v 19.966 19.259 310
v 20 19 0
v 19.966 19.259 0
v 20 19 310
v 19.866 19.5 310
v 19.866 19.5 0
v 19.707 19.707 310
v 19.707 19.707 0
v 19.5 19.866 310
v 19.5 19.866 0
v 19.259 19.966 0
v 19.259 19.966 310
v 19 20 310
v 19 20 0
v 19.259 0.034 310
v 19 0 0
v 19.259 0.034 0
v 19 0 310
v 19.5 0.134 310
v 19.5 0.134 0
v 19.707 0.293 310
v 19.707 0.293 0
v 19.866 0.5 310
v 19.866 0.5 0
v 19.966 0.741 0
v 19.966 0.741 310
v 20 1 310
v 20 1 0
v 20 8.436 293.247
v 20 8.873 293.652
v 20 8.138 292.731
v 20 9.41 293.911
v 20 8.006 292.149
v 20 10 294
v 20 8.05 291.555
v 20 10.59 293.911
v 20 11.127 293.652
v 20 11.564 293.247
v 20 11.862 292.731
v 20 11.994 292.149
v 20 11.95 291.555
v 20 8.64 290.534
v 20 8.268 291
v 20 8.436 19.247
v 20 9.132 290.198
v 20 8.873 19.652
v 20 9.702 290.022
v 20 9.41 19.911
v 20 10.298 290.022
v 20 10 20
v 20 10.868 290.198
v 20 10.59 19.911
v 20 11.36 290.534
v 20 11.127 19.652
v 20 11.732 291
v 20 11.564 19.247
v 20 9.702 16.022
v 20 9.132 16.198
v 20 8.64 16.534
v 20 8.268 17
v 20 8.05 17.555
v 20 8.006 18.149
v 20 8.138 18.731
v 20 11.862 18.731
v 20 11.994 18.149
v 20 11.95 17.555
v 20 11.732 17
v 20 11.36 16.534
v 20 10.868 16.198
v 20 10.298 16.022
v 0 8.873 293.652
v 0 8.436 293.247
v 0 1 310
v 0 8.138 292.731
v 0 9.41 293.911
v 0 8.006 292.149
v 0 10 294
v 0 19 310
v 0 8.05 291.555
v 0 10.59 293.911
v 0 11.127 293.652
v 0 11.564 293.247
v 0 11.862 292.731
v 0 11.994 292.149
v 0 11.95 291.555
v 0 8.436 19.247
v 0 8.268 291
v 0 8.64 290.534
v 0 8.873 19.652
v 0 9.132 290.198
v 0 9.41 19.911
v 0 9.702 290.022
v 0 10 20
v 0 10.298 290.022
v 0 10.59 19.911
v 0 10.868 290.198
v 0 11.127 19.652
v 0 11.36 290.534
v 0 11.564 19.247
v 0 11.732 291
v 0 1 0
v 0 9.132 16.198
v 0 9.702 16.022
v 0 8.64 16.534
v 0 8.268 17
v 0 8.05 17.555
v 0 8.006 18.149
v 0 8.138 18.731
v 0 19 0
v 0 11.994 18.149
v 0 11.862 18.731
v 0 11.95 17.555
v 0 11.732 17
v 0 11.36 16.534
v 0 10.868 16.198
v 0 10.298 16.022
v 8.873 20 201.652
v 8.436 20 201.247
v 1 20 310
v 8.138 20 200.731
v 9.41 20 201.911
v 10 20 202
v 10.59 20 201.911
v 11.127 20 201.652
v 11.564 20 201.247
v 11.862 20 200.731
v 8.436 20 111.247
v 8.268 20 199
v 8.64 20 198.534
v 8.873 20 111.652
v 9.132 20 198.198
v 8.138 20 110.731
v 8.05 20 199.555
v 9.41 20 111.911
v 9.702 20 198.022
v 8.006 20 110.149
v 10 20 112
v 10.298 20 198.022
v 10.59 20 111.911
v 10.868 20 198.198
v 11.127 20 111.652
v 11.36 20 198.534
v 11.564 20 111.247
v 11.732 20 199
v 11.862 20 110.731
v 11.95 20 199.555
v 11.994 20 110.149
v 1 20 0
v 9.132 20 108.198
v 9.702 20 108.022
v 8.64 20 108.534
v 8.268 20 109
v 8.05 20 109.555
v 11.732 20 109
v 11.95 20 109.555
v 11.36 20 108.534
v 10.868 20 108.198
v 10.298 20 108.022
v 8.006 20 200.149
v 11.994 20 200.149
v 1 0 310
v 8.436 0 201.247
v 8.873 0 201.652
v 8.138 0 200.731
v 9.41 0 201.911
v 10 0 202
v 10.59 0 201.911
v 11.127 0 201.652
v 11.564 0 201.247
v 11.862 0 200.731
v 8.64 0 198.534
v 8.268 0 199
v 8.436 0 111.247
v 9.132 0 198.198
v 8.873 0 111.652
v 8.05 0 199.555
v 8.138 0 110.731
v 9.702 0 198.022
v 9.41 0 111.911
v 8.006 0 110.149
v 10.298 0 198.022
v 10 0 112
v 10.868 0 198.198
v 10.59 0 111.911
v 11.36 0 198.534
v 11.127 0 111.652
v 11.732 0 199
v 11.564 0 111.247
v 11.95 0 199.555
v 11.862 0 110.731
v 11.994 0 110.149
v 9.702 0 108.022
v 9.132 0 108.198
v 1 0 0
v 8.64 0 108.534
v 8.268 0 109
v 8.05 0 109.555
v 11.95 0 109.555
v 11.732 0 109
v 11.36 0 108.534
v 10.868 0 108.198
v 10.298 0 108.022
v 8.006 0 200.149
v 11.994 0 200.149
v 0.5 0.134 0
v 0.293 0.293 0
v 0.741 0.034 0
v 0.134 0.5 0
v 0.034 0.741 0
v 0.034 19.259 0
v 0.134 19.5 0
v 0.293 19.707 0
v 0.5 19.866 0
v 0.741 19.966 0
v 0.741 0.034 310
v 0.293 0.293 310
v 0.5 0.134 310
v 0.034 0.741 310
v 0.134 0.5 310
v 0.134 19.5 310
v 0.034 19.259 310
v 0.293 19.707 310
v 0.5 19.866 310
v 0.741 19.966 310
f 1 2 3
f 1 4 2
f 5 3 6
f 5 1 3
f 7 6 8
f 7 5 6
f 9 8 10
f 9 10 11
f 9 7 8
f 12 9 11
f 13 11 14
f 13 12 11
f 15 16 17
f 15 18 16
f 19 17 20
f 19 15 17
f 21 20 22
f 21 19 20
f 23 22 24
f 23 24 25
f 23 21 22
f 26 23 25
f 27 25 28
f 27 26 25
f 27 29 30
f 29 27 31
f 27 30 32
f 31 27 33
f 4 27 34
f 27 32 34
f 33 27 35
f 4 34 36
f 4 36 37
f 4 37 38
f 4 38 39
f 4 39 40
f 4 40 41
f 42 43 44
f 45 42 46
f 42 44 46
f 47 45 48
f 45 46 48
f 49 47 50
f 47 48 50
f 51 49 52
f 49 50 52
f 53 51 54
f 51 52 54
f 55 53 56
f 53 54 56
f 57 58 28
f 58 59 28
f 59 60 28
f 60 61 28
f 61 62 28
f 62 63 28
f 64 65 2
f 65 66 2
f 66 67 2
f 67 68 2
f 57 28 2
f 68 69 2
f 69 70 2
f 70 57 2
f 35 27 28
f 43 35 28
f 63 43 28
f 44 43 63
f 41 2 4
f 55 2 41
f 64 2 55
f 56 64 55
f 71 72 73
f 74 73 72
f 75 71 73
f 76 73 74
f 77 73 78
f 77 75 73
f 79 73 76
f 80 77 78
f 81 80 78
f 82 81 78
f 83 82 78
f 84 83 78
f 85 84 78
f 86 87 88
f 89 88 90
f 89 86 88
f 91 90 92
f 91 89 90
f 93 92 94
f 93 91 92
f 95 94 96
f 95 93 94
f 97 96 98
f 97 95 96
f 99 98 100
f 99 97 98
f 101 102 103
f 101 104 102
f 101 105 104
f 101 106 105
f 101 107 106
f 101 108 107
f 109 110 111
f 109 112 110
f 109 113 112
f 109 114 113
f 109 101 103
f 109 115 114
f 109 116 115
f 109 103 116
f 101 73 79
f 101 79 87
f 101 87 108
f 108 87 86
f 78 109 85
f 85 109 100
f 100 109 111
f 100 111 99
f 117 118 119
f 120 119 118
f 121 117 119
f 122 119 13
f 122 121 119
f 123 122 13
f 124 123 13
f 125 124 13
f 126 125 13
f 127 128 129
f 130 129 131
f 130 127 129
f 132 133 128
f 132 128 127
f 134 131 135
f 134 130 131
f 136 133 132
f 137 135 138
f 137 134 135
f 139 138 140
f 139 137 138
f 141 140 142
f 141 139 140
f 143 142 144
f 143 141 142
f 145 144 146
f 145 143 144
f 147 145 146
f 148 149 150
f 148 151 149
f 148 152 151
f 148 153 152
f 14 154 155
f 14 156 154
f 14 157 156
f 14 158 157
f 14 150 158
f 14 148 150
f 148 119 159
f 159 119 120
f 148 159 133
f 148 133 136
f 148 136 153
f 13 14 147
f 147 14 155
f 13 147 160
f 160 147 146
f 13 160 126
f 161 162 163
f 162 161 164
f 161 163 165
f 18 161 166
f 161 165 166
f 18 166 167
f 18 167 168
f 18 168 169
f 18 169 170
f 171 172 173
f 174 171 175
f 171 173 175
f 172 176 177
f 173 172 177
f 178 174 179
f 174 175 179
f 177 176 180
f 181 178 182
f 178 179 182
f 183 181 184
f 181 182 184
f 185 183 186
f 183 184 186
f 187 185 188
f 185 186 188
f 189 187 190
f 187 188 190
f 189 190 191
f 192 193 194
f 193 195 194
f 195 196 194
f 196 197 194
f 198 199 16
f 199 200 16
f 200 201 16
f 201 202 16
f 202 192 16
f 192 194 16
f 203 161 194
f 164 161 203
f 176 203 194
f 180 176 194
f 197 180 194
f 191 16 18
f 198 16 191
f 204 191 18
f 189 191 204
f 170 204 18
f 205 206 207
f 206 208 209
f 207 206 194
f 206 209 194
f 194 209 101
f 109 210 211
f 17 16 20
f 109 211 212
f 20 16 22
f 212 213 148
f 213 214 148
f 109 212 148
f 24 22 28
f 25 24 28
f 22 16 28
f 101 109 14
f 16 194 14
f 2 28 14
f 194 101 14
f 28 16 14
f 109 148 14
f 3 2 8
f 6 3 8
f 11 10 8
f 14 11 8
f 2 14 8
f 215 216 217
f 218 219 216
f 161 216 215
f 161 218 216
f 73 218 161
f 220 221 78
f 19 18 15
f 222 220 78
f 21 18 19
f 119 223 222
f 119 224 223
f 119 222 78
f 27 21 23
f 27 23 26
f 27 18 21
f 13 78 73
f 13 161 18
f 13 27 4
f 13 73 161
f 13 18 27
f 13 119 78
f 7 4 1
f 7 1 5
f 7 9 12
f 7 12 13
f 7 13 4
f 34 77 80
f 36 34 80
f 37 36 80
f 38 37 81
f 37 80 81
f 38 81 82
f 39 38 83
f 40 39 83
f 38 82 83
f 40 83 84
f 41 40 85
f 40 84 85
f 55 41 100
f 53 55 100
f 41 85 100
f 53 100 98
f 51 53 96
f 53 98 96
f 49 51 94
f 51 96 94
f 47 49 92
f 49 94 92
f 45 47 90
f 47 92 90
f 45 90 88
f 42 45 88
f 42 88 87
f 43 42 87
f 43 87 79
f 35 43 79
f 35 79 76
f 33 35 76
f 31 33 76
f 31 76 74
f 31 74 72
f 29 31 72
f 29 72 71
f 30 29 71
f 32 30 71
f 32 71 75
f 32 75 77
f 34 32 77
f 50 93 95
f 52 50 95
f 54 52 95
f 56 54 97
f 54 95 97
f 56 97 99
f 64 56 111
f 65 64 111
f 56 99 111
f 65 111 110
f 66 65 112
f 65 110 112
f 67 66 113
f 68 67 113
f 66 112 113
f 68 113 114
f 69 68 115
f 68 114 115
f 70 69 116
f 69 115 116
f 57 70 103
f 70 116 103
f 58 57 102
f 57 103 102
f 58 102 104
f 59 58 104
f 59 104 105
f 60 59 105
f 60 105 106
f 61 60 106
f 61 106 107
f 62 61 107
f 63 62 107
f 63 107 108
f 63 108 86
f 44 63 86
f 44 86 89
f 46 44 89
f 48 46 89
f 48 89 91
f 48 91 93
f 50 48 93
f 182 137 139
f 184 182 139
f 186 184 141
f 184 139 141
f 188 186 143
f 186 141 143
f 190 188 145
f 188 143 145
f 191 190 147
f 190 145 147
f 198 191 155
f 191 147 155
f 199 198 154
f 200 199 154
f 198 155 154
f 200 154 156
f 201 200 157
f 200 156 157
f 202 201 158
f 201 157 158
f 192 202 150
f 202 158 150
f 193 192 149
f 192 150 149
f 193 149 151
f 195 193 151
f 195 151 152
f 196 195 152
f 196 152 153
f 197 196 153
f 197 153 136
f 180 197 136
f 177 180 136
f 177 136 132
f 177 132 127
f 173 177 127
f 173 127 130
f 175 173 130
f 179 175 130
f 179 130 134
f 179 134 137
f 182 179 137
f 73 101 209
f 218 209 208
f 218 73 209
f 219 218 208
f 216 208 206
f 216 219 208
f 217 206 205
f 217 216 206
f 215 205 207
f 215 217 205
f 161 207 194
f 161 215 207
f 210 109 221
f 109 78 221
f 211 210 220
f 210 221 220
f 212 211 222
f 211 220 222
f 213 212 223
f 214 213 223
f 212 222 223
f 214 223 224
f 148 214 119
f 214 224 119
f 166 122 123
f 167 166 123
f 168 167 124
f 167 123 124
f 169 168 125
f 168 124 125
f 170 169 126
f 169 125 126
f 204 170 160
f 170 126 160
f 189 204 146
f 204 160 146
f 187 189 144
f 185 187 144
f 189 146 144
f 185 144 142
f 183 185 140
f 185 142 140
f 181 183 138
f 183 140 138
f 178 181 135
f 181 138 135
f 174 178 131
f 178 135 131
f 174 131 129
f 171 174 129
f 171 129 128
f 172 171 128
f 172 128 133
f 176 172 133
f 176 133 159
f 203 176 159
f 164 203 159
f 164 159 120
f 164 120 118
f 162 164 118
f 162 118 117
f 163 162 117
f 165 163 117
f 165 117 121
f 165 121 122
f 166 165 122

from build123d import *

# Parameters (mm, degrees)
SKETCH_1_W          = 20
SKETCH_1_H          = 20
EXTRUDE_1_DEPTH     = 310
FILLET_1_R          = 1
SKETCH_2_R          = 2
CUT_EXTRUDE_1_DEPTH = 310
SKETCH_3_R          = 2
CUT_EXTRUDE_2_DEPTH = 310


with BuildPart() as part:
    # 草图1 → 凸台-拉伸1 (new body)
    with BuildSketch(Plane.XY):
        with Locations((10, 10)):
            Rectangle(SKETCH_1_W, SKETCH_1_H)
    extrude(amount=EXTRUDE_1_DEPTH)

    # 圆角1
    fillet_1_edges = [part.edges().sort_by_distance(p)[0] for p in [
        (0, 20, 155),
        (20, 20, 155),
        (20, 0, 155),
        (0, 0, 155),
    ]]
    fillet(fillet_1_edges, radius=FILLET_1_R)

    # 草图2 → 切除-拉伸1 (cut)
    with BuildSketch(Plane(origin=(0, 20, 0), x_dir=(1, 0, 0), z_dir=(0, 1, 0))):
        with Locations(Location((10, -110, 0), (0, 0, 270))):
            Circle(SKETCH_2_R)
        with Locations(Location((10, -200, 0), (0, 0, 270))):
            Circle(SKETCH_2_R)
    extrude(amount=-CUT_EXTRUDE_1_DEPTH, mode=Mode.SUBTRACT)

    # 草图3 → 切除-拉伸2 (cut)
    with BuildSketch(Plane.ZY):
        with Locations((18, 10)):
            Circle(SKETCH_3_R)
        with Locations((292, 10)):
            Circle(SKETCH_3_R)
    extrude(amount=-CUT_EXTRUDE_2_DEPTH, mode=Mode.SUBTRACT)


solid = part.part
